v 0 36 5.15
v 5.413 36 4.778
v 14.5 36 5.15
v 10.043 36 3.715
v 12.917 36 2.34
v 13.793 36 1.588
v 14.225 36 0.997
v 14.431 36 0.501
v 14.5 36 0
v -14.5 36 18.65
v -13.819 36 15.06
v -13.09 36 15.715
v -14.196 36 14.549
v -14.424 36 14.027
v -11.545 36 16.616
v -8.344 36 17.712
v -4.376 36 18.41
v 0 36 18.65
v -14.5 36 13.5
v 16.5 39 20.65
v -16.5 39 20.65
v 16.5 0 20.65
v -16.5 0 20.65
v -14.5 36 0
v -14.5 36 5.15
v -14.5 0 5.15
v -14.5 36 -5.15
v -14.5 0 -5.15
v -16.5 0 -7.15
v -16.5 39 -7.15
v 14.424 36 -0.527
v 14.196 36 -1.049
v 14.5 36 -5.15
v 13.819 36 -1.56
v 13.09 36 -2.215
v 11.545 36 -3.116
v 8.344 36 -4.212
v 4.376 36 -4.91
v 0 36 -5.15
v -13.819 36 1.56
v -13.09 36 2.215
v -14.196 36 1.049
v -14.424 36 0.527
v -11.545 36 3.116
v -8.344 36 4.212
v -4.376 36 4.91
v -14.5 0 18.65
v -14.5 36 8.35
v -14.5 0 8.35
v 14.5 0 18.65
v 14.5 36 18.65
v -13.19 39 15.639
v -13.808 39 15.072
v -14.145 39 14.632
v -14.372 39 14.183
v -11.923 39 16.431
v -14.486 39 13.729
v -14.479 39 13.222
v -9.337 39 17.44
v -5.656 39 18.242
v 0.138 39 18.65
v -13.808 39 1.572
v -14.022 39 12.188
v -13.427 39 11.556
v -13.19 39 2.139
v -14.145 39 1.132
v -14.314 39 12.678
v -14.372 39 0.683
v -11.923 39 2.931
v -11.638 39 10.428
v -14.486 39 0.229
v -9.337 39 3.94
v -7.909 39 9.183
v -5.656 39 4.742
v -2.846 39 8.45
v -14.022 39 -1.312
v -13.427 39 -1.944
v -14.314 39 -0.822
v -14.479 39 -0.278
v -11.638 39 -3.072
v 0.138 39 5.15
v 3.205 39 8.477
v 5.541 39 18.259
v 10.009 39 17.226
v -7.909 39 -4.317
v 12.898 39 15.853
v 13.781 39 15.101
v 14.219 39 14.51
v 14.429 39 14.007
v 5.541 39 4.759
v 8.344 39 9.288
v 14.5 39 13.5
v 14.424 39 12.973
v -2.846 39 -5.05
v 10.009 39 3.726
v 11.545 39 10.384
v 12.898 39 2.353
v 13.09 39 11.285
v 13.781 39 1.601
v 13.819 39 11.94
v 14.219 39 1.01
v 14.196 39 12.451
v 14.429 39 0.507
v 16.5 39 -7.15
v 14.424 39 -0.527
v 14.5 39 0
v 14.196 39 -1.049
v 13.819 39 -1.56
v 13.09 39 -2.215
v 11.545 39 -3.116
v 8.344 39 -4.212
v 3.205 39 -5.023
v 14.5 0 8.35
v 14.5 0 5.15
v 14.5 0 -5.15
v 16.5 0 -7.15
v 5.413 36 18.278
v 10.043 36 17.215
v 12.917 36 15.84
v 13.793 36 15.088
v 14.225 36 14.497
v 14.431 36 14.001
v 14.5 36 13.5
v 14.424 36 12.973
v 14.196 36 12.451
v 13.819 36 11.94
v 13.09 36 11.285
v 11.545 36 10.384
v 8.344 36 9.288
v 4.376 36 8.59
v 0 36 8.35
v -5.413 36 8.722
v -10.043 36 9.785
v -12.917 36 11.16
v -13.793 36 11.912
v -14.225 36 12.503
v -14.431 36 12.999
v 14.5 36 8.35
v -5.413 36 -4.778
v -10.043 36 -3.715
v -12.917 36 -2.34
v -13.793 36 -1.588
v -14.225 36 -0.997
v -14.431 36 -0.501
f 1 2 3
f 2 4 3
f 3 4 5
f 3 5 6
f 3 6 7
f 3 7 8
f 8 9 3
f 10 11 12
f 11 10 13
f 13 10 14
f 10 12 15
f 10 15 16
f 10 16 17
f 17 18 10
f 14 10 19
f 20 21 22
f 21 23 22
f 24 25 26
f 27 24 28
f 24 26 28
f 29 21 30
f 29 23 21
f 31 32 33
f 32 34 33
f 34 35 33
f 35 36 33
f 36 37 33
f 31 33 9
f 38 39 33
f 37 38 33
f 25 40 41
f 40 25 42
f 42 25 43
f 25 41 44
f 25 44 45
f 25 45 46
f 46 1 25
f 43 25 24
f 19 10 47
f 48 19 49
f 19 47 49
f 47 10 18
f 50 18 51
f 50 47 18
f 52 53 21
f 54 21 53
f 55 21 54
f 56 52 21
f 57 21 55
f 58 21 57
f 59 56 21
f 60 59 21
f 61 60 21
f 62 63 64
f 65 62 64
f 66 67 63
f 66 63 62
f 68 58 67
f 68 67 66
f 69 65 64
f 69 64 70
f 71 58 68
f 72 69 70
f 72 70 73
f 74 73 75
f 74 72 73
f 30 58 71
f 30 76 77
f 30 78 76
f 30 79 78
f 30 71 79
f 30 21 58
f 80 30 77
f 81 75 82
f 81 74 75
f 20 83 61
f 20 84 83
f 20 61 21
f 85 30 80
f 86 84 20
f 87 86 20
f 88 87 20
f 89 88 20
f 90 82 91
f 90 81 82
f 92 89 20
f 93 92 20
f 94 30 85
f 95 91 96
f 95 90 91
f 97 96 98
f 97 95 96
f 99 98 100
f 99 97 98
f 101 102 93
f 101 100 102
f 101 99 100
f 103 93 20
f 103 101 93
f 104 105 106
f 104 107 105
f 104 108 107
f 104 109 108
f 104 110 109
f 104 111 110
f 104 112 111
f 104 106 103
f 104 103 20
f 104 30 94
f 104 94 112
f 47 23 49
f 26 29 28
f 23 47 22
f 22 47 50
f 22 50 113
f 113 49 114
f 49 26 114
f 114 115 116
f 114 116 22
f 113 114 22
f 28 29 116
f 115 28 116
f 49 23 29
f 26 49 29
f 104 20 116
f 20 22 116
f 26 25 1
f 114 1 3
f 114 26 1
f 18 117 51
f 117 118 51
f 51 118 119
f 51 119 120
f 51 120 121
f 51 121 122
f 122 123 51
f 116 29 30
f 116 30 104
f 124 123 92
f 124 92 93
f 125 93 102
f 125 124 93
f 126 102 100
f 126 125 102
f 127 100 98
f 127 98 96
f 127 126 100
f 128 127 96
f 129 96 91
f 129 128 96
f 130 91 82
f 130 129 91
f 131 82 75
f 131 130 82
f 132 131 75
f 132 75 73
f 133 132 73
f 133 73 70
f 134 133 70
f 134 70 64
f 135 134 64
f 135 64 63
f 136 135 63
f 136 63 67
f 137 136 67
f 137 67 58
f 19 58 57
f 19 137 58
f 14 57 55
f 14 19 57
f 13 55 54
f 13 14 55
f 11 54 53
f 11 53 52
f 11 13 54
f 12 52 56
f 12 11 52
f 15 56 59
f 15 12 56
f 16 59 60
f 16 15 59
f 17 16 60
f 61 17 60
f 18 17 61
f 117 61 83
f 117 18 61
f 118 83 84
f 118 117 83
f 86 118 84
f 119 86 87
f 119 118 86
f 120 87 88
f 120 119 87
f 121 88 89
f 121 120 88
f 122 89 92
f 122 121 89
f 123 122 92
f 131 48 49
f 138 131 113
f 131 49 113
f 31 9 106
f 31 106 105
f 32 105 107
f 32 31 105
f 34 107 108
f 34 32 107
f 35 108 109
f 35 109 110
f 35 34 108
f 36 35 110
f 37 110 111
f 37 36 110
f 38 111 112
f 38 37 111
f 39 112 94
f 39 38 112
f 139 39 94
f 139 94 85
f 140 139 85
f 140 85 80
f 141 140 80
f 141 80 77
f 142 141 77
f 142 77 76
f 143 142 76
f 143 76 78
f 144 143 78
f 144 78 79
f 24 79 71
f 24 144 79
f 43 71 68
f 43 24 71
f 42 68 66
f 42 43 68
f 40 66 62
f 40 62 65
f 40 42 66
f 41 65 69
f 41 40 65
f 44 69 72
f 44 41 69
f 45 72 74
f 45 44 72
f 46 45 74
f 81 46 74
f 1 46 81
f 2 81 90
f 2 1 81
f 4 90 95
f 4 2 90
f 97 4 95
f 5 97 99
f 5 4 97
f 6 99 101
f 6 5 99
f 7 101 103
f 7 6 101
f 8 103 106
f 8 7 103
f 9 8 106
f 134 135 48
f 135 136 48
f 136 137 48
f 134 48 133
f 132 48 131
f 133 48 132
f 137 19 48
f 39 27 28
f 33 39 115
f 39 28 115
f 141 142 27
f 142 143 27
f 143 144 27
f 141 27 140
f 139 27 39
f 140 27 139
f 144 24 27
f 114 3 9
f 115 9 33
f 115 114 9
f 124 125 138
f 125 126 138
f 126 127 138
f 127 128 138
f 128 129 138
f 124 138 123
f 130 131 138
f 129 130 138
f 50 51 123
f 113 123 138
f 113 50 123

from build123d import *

# Parameters (mm, degrees)
SKETCH_1_W             = 33
SKETCH_1_H             = 14.3
SKETCH_1_W_2           = 29
SKETCH_1_H_2           = 10.3
EXTRUDE_2_DEPTH        = 36
SKETCH_2_W             = 33
SKETCH_2_H             = 14.3
SKETCH_2_RX            = 14.5
SKETCH_2_RY            = 5.15
EXTRUDE_3_DEPTH        = 3
PATTERN_LINEAR_1_COUNT = 2
PATTERN_LINEAR_1_PITCH = 13.5


with BuildPart() as part:
    # 草图1 → 凸台-拉伸2 (new body)
    with BuildSketch(Plane(origin=(0, 0, 0), x_dir=(1, 0, 0), z_dir=(0, 1, 0))):
        Rectangle(SKETCH_1_W, SKETCH_1_H)
        Rectangle(SKETCH_1_W_2, SKETCH_1_H_2, mode=Mode.SUBTRACT)
    extrude_2 = extrude(amount=EXTRUDE_2_DEPTH)

    # 草图2 → 凸台-拉伸3 (add)
    with BuildSketch(Plane(origin=(0, 36, 0), x_dir=(1, 0, 0), z_dir=(0, 1, 0))):
        Rectangle(SKETCH_2_W, SKETCH_2_H)
        with Locations(Location((0, 0), (0, 0, 0))):
            Ellipse(SKETCH_2_RX, SKETCH_2_RY, mode=Mode.SUBTRACT)
    extrude_3 = extrude(amount=EXTRUDE_3_DEPTH)

    # 阵列(线性)1: 凸台-拉伸2, 凸台-拉伸3 ×2
    with Locations(*[(0, 0, i * PATTERN_LINEAR_1_PITCH) for i in range(1, PATTERN_LINEAR_1_COUNT)]):
        add(extrude_2)
        add(extrude_3)


solid = part.part
